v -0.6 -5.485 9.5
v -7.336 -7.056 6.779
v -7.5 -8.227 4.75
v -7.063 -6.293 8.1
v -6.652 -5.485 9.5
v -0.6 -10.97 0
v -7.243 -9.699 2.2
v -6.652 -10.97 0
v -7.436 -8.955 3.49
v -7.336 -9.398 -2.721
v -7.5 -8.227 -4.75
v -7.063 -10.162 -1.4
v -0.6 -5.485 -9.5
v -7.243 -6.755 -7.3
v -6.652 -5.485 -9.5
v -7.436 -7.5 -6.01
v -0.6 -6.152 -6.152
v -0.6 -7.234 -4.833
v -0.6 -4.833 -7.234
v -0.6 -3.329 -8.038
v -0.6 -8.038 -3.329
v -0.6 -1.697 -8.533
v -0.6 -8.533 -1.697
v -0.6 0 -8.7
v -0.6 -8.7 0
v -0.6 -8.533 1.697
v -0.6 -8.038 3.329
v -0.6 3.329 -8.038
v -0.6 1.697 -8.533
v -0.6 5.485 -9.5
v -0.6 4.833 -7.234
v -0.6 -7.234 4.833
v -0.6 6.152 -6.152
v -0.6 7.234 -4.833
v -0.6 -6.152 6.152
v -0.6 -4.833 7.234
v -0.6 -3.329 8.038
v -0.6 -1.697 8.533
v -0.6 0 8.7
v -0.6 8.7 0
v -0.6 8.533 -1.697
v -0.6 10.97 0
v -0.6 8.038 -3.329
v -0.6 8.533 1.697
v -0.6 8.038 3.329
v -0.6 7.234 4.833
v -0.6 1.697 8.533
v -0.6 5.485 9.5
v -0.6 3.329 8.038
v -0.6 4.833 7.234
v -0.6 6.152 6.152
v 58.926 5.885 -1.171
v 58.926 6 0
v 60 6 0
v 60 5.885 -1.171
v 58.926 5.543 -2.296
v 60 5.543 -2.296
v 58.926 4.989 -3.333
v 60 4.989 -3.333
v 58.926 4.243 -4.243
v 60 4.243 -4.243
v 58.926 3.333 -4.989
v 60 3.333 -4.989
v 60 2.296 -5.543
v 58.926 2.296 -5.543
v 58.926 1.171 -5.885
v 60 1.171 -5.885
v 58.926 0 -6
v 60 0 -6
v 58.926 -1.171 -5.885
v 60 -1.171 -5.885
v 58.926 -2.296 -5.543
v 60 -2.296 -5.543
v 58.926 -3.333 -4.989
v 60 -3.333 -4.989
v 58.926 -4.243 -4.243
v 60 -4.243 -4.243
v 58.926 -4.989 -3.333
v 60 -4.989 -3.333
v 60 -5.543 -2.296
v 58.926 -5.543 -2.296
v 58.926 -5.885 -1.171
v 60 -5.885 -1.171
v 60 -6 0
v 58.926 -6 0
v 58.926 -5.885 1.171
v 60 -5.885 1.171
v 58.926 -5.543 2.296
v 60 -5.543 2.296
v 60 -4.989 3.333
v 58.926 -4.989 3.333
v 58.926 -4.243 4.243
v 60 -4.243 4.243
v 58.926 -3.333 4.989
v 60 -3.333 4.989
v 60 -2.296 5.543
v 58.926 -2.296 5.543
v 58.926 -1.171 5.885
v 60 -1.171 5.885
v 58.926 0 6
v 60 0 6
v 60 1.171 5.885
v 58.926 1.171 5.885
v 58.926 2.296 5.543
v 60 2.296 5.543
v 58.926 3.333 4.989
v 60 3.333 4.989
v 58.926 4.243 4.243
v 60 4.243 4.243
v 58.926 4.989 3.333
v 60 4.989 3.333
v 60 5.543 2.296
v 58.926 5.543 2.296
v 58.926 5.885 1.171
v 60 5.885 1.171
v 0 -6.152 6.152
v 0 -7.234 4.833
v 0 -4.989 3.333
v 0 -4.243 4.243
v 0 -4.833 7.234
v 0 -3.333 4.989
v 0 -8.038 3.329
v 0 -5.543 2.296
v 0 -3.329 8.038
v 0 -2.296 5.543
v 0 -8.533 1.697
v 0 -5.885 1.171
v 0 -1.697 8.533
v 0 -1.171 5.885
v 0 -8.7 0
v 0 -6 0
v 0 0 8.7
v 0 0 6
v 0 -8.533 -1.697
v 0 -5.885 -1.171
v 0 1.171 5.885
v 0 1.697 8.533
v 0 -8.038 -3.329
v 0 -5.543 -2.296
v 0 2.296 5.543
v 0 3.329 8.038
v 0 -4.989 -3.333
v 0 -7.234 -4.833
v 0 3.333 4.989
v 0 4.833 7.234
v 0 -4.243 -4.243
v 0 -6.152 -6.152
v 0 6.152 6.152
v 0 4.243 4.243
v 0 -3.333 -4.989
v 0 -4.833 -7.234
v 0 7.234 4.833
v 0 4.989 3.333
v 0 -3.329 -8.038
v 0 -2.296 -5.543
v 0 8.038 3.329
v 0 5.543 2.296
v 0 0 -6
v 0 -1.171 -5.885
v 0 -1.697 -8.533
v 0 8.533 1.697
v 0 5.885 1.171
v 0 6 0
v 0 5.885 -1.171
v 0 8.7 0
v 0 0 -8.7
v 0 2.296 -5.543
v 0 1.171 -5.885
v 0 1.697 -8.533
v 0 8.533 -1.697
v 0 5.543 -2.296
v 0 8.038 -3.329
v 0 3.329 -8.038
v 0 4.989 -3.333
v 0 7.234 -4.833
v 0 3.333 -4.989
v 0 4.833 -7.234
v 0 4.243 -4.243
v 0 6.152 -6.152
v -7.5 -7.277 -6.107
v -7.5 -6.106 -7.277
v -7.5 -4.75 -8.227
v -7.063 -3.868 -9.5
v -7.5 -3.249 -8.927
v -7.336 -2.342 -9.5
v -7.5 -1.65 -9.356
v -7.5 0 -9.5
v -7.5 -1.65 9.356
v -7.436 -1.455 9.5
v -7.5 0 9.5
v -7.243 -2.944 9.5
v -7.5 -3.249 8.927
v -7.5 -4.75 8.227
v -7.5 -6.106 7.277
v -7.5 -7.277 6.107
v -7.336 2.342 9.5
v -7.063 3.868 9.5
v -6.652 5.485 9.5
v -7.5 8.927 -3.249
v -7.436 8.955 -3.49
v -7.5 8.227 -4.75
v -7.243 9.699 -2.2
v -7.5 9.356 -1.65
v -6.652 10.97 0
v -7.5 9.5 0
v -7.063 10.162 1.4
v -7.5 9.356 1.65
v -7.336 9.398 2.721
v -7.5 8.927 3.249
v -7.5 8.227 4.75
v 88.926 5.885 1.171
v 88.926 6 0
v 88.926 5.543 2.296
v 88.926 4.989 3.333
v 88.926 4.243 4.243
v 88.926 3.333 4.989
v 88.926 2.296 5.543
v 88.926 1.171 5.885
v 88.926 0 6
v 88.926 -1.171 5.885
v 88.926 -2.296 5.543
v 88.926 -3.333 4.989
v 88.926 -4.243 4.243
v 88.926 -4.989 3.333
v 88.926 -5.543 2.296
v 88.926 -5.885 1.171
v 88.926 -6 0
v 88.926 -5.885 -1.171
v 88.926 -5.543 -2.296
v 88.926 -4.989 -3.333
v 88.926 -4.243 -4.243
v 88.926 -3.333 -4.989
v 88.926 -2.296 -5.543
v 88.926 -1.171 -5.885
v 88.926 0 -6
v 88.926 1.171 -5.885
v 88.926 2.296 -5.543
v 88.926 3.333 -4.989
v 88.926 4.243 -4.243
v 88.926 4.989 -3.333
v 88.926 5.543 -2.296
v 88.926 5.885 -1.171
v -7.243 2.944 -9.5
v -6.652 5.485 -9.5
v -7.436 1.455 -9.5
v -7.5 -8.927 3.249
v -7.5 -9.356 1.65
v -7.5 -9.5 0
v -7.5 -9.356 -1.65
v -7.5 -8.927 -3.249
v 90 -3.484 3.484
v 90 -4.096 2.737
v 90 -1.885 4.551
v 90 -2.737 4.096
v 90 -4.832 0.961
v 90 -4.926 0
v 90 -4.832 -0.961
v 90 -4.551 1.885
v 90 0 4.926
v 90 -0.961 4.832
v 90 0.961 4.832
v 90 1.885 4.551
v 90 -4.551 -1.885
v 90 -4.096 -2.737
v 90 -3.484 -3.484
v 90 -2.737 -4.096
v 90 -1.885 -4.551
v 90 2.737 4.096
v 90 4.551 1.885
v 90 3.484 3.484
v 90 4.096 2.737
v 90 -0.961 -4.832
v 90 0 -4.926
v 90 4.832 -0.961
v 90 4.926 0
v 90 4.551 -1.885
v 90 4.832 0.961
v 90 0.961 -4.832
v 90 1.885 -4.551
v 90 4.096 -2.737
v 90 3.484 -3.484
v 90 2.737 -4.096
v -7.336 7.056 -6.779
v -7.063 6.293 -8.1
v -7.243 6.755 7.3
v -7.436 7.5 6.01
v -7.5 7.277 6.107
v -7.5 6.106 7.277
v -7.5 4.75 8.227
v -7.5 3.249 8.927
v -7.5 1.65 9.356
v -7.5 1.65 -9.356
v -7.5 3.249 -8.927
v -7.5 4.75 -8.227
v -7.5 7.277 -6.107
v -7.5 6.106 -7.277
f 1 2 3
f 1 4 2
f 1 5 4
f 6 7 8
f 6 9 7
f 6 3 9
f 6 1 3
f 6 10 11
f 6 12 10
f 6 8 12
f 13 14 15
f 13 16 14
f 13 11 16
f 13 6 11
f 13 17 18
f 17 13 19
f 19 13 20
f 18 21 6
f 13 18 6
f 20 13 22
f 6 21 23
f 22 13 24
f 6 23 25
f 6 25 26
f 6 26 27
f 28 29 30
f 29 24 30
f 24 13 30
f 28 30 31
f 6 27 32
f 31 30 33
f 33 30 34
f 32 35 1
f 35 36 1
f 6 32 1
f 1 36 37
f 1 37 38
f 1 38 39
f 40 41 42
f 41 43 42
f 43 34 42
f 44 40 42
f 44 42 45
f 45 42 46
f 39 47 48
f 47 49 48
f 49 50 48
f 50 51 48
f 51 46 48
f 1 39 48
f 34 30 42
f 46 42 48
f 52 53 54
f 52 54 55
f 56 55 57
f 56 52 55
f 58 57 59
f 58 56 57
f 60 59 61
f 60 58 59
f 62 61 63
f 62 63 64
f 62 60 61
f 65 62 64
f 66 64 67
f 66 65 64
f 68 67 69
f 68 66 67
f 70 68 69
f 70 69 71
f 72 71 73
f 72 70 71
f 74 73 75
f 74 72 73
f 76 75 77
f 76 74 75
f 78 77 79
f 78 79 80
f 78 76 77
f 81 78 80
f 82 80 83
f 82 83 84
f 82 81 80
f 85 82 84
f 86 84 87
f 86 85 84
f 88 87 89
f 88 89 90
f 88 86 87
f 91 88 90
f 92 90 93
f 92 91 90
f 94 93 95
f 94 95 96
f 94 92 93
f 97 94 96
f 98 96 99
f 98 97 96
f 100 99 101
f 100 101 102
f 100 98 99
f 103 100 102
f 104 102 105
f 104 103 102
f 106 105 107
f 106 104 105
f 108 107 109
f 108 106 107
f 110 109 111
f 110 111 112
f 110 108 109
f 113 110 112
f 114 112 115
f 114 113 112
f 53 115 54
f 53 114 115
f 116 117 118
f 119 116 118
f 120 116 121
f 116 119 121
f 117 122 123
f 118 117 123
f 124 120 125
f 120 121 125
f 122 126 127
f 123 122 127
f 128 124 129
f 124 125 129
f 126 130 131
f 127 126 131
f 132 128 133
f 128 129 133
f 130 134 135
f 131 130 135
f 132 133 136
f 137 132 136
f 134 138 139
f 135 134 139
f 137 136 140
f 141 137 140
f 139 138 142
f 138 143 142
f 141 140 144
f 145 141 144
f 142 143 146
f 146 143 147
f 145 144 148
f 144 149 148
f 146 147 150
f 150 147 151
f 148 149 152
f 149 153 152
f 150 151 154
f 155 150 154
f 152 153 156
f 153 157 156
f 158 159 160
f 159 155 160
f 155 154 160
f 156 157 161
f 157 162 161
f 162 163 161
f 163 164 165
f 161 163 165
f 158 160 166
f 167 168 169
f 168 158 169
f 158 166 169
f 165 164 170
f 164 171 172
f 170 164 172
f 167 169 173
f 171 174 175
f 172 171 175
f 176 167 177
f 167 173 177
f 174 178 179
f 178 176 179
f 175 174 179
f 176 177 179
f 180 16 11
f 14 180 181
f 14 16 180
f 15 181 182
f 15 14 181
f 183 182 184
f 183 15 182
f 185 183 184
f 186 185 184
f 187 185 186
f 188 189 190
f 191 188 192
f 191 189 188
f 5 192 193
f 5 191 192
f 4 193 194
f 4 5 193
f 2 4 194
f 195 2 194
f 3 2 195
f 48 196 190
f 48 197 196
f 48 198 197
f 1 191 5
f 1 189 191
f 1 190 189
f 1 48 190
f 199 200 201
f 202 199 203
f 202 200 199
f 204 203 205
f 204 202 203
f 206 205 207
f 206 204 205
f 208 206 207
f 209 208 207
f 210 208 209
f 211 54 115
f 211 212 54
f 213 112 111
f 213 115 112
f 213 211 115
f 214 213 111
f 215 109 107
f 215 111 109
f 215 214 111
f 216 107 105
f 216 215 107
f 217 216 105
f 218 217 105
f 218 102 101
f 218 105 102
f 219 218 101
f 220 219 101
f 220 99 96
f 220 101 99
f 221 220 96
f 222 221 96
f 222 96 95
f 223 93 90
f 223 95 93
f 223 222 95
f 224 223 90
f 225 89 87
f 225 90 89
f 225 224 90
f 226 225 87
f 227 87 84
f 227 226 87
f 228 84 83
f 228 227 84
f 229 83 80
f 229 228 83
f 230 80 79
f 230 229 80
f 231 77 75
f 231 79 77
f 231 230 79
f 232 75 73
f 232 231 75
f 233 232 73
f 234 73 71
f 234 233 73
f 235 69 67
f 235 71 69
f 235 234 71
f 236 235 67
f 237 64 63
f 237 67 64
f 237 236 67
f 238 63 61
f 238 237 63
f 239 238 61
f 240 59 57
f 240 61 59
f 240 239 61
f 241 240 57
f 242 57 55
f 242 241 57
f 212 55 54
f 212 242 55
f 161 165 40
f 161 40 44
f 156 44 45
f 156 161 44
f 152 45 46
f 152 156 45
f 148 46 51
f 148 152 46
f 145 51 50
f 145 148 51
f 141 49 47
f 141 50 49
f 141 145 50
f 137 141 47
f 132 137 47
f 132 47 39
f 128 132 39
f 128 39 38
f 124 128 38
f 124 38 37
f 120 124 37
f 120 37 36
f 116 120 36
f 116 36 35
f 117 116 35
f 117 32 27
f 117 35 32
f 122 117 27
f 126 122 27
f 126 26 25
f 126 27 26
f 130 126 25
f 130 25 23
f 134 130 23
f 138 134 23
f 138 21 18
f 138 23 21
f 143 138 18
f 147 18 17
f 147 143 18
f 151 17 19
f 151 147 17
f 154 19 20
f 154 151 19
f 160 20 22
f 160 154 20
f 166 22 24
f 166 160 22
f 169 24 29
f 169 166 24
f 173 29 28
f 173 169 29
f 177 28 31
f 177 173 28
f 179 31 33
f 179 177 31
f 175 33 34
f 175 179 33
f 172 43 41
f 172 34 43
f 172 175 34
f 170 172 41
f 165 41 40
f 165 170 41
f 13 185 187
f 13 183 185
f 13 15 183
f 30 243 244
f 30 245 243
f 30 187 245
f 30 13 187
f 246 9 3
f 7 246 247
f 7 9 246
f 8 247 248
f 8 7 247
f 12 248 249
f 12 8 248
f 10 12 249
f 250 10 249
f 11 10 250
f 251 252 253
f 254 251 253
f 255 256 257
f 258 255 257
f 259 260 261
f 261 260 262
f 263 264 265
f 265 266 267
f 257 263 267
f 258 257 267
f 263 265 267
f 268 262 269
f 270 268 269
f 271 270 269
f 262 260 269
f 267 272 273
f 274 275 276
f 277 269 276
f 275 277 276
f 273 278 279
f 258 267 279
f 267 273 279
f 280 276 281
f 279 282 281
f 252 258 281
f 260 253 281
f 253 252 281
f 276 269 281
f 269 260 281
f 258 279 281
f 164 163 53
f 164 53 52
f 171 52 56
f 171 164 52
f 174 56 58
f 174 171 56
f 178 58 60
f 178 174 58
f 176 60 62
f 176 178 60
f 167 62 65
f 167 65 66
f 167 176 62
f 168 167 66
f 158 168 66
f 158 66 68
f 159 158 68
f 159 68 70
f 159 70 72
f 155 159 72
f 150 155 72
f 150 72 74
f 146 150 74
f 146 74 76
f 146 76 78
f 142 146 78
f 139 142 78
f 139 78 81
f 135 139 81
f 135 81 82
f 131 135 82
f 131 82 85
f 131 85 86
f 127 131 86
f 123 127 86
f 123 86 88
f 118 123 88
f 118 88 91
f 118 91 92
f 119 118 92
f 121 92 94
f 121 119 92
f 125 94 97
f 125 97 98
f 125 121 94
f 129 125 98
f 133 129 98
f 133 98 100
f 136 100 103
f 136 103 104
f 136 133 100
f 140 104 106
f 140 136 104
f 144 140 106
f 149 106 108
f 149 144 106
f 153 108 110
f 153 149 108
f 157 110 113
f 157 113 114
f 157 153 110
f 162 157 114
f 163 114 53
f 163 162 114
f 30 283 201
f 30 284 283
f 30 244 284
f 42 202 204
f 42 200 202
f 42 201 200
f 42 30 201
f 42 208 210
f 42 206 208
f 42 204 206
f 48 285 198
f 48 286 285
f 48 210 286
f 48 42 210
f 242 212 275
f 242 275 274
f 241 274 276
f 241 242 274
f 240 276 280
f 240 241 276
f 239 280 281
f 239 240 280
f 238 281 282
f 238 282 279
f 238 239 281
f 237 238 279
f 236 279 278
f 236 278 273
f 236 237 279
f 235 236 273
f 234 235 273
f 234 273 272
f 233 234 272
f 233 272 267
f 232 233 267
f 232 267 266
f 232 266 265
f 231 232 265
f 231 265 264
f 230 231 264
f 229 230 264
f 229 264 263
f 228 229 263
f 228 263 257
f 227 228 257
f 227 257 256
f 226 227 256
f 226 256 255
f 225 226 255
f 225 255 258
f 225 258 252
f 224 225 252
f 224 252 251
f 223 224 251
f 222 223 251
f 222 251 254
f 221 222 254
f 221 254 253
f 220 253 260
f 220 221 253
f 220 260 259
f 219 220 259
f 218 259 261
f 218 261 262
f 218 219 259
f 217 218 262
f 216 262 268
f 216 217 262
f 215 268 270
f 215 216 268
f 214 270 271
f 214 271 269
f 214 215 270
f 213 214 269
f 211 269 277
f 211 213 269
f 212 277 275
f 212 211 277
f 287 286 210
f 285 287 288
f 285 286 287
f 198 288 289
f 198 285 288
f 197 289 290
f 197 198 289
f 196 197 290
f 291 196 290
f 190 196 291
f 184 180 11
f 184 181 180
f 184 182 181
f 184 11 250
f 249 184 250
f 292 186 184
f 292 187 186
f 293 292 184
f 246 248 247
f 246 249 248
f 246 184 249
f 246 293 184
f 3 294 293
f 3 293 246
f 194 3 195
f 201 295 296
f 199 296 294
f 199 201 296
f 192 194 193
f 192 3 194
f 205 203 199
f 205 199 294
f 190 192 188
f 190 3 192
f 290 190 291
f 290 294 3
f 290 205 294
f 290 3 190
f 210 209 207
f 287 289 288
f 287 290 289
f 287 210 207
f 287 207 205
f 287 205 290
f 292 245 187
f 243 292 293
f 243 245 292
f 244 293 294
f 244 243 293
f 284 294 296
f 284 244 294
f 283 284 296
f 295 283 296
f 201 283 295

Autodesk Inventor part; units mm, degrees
ref_plane "YZ Plane" through (0, 0, 0) normal (1, 0, 0) x (0, 1, 0)
ref_plane "XZ Plane" through (0, 0, 0) normal (0, 1, 0) x (-1, 0, 0)
ref_plane "XY Plane" through (0, 0, 0) normal (0, 0, 1) x (1, 0, 0)
sketch "Skizze1" plane through (0, 0, 0) normal (0, 0, 1) x (1, 0, 0)
  line L0 (0, 8.7) -> (0, 6)
  line L1 (60, 6) -> (90, 6)
  line L2 (90, 6) -> (90, 0)
  line L3 (90, 0) -> (-0.6001, 0)
  line L4 (-0.4751, 0) -> (2.675, 0) projected
  line L5 (-0.6001, 0) -> (-0.6001, 8.7)
  line L6 (-0.6001, 8.7) -> (0, 8.7)
  line L7 (60, 6) -> (58.9264, 6)
  line L8 (58.9264, 6) -> (0, 6)
  line L9 (0, -0.1135) -> (0, 1.4755) projected
  dimension "d0" = 90
  dimension "d1" = 30
  dimension "d2" = 12
  dimension "d9" = 0.6001
  dimension "d10" = 17.4
  dimension "d13" = 1.0736
  dimension "d14" = 12
revolve "Körper" add sketch "Skizze1" angle 360 about axis through (90, 0, 0) along (-1, 0, 0)
sketch "Skizze2" plane through (-0.6001, 0, 0) normal (-1, 0, 0) x (0, 0, 1)
  line L0 (0, 10.9697) -> (9.5, 5.4848)
  line L1 (9.5, 5.4848) -> (9.5, -5.4848)
  line L2 (9.5, -5.4848) -> (0, -10.9697)
  line L3 (0, -10.9697) -> (-9.5, -5.4848)
  line L4 (-9.5, -5.4848) -> (-9.5, 5.4848)
  line L5 (-9.5, 5.4848) -> (0, 10.9697)
  point P0 (0, 0)
  point P1 (0, 0)
  dimension "d11" = 19
extrude "Kopf" add sketch "Skizze2" along normal blind 6.9
sketch "Skizze4" plane through (0, 0, 0) normal (0, 0, 1) x (1, 0, 0)
  line L0 (-7.5001, 9.5) -> (-7.5001, 10.9697)
  line L1 (-7.5001, 10.9697) -> (-6.6516, 10.9697)
  line L2 (-6.6516, 10.9697) -> (-7.5001, 9.5)
  line L3 (-1.1851, 0) -> (0.0049, 0) projected
  line L4 (-0.6001, 10.9697) -> (-7.5001, 10.9697) projected
  line L5 (-7.5001, 5.4848) -> (-7.5001, 10.9697) projected
  dimension "d5" = 30
  dimension "d19" = 19
revolve "Fase1" cut sketch "Skizze4" angle 360 about axis through (-10, 0, 0) along (1, 0, 0)
thread "Gewinde" size "M1.6x0.35" class "6g" standard "ANSI Metric M Profile" length 30
chamfer "Fase2" distance 1.0735 distance2 1.0736 1 edges at (90, -6, 0) measured on face at (90, 0.7092, -1.87)
equation "\"d0\" = NLG"
equation "\"d1\" = GEL"
equation "\"d2\" = GD"
equation "\"d10\" = SD2"
equation "\"d14\" = BDM"
equation "\"d11\" = SW"
equation "\"d3\" = KOH - SD"
equation "\"d5\" = ANG1"
equation "\"d19\" = SW0"
equation "\"d15\" = GEL"
equation "\"d6\" = -0.5 * SPD + 0.5 * GD"
equation "\"NLG\" = 90"
equation "\"GD\" = NND"
equation "\"BDM\" = NND"
equation "\"KOH\" = 7.5"
equation "\"GEL\" = 30"
equation "\"SW\" = 19"
equation "\"SW0\" = SW"
equation "\"SPD\" = NND - 1.2269 * TPU"
equation "\"SD2\" = 17.4"
equation "\"SD\" = 0.6"
equation "\"ANG1\" = 30deg"
equation "\"GAL\" = 0.61345 * TPU"
equation "\"GUL\" = 0.61345 * TPU"
equation "\"RR\" = 0.6"
equation "\"TOA\" = 30deg"
equation "\"PTC\" = TPU"
equation "\"GD1\" = THREADDIA - 1.2269 * TPU"
equation "\"TPU\" = 1.75"
equation "\"THREADDIA\" = 12"
equation "\"E0\" = 1.155 * SW"
equation "\"NND\" = 12"
properties part number "DIN 931-1 - M12 x 90"
